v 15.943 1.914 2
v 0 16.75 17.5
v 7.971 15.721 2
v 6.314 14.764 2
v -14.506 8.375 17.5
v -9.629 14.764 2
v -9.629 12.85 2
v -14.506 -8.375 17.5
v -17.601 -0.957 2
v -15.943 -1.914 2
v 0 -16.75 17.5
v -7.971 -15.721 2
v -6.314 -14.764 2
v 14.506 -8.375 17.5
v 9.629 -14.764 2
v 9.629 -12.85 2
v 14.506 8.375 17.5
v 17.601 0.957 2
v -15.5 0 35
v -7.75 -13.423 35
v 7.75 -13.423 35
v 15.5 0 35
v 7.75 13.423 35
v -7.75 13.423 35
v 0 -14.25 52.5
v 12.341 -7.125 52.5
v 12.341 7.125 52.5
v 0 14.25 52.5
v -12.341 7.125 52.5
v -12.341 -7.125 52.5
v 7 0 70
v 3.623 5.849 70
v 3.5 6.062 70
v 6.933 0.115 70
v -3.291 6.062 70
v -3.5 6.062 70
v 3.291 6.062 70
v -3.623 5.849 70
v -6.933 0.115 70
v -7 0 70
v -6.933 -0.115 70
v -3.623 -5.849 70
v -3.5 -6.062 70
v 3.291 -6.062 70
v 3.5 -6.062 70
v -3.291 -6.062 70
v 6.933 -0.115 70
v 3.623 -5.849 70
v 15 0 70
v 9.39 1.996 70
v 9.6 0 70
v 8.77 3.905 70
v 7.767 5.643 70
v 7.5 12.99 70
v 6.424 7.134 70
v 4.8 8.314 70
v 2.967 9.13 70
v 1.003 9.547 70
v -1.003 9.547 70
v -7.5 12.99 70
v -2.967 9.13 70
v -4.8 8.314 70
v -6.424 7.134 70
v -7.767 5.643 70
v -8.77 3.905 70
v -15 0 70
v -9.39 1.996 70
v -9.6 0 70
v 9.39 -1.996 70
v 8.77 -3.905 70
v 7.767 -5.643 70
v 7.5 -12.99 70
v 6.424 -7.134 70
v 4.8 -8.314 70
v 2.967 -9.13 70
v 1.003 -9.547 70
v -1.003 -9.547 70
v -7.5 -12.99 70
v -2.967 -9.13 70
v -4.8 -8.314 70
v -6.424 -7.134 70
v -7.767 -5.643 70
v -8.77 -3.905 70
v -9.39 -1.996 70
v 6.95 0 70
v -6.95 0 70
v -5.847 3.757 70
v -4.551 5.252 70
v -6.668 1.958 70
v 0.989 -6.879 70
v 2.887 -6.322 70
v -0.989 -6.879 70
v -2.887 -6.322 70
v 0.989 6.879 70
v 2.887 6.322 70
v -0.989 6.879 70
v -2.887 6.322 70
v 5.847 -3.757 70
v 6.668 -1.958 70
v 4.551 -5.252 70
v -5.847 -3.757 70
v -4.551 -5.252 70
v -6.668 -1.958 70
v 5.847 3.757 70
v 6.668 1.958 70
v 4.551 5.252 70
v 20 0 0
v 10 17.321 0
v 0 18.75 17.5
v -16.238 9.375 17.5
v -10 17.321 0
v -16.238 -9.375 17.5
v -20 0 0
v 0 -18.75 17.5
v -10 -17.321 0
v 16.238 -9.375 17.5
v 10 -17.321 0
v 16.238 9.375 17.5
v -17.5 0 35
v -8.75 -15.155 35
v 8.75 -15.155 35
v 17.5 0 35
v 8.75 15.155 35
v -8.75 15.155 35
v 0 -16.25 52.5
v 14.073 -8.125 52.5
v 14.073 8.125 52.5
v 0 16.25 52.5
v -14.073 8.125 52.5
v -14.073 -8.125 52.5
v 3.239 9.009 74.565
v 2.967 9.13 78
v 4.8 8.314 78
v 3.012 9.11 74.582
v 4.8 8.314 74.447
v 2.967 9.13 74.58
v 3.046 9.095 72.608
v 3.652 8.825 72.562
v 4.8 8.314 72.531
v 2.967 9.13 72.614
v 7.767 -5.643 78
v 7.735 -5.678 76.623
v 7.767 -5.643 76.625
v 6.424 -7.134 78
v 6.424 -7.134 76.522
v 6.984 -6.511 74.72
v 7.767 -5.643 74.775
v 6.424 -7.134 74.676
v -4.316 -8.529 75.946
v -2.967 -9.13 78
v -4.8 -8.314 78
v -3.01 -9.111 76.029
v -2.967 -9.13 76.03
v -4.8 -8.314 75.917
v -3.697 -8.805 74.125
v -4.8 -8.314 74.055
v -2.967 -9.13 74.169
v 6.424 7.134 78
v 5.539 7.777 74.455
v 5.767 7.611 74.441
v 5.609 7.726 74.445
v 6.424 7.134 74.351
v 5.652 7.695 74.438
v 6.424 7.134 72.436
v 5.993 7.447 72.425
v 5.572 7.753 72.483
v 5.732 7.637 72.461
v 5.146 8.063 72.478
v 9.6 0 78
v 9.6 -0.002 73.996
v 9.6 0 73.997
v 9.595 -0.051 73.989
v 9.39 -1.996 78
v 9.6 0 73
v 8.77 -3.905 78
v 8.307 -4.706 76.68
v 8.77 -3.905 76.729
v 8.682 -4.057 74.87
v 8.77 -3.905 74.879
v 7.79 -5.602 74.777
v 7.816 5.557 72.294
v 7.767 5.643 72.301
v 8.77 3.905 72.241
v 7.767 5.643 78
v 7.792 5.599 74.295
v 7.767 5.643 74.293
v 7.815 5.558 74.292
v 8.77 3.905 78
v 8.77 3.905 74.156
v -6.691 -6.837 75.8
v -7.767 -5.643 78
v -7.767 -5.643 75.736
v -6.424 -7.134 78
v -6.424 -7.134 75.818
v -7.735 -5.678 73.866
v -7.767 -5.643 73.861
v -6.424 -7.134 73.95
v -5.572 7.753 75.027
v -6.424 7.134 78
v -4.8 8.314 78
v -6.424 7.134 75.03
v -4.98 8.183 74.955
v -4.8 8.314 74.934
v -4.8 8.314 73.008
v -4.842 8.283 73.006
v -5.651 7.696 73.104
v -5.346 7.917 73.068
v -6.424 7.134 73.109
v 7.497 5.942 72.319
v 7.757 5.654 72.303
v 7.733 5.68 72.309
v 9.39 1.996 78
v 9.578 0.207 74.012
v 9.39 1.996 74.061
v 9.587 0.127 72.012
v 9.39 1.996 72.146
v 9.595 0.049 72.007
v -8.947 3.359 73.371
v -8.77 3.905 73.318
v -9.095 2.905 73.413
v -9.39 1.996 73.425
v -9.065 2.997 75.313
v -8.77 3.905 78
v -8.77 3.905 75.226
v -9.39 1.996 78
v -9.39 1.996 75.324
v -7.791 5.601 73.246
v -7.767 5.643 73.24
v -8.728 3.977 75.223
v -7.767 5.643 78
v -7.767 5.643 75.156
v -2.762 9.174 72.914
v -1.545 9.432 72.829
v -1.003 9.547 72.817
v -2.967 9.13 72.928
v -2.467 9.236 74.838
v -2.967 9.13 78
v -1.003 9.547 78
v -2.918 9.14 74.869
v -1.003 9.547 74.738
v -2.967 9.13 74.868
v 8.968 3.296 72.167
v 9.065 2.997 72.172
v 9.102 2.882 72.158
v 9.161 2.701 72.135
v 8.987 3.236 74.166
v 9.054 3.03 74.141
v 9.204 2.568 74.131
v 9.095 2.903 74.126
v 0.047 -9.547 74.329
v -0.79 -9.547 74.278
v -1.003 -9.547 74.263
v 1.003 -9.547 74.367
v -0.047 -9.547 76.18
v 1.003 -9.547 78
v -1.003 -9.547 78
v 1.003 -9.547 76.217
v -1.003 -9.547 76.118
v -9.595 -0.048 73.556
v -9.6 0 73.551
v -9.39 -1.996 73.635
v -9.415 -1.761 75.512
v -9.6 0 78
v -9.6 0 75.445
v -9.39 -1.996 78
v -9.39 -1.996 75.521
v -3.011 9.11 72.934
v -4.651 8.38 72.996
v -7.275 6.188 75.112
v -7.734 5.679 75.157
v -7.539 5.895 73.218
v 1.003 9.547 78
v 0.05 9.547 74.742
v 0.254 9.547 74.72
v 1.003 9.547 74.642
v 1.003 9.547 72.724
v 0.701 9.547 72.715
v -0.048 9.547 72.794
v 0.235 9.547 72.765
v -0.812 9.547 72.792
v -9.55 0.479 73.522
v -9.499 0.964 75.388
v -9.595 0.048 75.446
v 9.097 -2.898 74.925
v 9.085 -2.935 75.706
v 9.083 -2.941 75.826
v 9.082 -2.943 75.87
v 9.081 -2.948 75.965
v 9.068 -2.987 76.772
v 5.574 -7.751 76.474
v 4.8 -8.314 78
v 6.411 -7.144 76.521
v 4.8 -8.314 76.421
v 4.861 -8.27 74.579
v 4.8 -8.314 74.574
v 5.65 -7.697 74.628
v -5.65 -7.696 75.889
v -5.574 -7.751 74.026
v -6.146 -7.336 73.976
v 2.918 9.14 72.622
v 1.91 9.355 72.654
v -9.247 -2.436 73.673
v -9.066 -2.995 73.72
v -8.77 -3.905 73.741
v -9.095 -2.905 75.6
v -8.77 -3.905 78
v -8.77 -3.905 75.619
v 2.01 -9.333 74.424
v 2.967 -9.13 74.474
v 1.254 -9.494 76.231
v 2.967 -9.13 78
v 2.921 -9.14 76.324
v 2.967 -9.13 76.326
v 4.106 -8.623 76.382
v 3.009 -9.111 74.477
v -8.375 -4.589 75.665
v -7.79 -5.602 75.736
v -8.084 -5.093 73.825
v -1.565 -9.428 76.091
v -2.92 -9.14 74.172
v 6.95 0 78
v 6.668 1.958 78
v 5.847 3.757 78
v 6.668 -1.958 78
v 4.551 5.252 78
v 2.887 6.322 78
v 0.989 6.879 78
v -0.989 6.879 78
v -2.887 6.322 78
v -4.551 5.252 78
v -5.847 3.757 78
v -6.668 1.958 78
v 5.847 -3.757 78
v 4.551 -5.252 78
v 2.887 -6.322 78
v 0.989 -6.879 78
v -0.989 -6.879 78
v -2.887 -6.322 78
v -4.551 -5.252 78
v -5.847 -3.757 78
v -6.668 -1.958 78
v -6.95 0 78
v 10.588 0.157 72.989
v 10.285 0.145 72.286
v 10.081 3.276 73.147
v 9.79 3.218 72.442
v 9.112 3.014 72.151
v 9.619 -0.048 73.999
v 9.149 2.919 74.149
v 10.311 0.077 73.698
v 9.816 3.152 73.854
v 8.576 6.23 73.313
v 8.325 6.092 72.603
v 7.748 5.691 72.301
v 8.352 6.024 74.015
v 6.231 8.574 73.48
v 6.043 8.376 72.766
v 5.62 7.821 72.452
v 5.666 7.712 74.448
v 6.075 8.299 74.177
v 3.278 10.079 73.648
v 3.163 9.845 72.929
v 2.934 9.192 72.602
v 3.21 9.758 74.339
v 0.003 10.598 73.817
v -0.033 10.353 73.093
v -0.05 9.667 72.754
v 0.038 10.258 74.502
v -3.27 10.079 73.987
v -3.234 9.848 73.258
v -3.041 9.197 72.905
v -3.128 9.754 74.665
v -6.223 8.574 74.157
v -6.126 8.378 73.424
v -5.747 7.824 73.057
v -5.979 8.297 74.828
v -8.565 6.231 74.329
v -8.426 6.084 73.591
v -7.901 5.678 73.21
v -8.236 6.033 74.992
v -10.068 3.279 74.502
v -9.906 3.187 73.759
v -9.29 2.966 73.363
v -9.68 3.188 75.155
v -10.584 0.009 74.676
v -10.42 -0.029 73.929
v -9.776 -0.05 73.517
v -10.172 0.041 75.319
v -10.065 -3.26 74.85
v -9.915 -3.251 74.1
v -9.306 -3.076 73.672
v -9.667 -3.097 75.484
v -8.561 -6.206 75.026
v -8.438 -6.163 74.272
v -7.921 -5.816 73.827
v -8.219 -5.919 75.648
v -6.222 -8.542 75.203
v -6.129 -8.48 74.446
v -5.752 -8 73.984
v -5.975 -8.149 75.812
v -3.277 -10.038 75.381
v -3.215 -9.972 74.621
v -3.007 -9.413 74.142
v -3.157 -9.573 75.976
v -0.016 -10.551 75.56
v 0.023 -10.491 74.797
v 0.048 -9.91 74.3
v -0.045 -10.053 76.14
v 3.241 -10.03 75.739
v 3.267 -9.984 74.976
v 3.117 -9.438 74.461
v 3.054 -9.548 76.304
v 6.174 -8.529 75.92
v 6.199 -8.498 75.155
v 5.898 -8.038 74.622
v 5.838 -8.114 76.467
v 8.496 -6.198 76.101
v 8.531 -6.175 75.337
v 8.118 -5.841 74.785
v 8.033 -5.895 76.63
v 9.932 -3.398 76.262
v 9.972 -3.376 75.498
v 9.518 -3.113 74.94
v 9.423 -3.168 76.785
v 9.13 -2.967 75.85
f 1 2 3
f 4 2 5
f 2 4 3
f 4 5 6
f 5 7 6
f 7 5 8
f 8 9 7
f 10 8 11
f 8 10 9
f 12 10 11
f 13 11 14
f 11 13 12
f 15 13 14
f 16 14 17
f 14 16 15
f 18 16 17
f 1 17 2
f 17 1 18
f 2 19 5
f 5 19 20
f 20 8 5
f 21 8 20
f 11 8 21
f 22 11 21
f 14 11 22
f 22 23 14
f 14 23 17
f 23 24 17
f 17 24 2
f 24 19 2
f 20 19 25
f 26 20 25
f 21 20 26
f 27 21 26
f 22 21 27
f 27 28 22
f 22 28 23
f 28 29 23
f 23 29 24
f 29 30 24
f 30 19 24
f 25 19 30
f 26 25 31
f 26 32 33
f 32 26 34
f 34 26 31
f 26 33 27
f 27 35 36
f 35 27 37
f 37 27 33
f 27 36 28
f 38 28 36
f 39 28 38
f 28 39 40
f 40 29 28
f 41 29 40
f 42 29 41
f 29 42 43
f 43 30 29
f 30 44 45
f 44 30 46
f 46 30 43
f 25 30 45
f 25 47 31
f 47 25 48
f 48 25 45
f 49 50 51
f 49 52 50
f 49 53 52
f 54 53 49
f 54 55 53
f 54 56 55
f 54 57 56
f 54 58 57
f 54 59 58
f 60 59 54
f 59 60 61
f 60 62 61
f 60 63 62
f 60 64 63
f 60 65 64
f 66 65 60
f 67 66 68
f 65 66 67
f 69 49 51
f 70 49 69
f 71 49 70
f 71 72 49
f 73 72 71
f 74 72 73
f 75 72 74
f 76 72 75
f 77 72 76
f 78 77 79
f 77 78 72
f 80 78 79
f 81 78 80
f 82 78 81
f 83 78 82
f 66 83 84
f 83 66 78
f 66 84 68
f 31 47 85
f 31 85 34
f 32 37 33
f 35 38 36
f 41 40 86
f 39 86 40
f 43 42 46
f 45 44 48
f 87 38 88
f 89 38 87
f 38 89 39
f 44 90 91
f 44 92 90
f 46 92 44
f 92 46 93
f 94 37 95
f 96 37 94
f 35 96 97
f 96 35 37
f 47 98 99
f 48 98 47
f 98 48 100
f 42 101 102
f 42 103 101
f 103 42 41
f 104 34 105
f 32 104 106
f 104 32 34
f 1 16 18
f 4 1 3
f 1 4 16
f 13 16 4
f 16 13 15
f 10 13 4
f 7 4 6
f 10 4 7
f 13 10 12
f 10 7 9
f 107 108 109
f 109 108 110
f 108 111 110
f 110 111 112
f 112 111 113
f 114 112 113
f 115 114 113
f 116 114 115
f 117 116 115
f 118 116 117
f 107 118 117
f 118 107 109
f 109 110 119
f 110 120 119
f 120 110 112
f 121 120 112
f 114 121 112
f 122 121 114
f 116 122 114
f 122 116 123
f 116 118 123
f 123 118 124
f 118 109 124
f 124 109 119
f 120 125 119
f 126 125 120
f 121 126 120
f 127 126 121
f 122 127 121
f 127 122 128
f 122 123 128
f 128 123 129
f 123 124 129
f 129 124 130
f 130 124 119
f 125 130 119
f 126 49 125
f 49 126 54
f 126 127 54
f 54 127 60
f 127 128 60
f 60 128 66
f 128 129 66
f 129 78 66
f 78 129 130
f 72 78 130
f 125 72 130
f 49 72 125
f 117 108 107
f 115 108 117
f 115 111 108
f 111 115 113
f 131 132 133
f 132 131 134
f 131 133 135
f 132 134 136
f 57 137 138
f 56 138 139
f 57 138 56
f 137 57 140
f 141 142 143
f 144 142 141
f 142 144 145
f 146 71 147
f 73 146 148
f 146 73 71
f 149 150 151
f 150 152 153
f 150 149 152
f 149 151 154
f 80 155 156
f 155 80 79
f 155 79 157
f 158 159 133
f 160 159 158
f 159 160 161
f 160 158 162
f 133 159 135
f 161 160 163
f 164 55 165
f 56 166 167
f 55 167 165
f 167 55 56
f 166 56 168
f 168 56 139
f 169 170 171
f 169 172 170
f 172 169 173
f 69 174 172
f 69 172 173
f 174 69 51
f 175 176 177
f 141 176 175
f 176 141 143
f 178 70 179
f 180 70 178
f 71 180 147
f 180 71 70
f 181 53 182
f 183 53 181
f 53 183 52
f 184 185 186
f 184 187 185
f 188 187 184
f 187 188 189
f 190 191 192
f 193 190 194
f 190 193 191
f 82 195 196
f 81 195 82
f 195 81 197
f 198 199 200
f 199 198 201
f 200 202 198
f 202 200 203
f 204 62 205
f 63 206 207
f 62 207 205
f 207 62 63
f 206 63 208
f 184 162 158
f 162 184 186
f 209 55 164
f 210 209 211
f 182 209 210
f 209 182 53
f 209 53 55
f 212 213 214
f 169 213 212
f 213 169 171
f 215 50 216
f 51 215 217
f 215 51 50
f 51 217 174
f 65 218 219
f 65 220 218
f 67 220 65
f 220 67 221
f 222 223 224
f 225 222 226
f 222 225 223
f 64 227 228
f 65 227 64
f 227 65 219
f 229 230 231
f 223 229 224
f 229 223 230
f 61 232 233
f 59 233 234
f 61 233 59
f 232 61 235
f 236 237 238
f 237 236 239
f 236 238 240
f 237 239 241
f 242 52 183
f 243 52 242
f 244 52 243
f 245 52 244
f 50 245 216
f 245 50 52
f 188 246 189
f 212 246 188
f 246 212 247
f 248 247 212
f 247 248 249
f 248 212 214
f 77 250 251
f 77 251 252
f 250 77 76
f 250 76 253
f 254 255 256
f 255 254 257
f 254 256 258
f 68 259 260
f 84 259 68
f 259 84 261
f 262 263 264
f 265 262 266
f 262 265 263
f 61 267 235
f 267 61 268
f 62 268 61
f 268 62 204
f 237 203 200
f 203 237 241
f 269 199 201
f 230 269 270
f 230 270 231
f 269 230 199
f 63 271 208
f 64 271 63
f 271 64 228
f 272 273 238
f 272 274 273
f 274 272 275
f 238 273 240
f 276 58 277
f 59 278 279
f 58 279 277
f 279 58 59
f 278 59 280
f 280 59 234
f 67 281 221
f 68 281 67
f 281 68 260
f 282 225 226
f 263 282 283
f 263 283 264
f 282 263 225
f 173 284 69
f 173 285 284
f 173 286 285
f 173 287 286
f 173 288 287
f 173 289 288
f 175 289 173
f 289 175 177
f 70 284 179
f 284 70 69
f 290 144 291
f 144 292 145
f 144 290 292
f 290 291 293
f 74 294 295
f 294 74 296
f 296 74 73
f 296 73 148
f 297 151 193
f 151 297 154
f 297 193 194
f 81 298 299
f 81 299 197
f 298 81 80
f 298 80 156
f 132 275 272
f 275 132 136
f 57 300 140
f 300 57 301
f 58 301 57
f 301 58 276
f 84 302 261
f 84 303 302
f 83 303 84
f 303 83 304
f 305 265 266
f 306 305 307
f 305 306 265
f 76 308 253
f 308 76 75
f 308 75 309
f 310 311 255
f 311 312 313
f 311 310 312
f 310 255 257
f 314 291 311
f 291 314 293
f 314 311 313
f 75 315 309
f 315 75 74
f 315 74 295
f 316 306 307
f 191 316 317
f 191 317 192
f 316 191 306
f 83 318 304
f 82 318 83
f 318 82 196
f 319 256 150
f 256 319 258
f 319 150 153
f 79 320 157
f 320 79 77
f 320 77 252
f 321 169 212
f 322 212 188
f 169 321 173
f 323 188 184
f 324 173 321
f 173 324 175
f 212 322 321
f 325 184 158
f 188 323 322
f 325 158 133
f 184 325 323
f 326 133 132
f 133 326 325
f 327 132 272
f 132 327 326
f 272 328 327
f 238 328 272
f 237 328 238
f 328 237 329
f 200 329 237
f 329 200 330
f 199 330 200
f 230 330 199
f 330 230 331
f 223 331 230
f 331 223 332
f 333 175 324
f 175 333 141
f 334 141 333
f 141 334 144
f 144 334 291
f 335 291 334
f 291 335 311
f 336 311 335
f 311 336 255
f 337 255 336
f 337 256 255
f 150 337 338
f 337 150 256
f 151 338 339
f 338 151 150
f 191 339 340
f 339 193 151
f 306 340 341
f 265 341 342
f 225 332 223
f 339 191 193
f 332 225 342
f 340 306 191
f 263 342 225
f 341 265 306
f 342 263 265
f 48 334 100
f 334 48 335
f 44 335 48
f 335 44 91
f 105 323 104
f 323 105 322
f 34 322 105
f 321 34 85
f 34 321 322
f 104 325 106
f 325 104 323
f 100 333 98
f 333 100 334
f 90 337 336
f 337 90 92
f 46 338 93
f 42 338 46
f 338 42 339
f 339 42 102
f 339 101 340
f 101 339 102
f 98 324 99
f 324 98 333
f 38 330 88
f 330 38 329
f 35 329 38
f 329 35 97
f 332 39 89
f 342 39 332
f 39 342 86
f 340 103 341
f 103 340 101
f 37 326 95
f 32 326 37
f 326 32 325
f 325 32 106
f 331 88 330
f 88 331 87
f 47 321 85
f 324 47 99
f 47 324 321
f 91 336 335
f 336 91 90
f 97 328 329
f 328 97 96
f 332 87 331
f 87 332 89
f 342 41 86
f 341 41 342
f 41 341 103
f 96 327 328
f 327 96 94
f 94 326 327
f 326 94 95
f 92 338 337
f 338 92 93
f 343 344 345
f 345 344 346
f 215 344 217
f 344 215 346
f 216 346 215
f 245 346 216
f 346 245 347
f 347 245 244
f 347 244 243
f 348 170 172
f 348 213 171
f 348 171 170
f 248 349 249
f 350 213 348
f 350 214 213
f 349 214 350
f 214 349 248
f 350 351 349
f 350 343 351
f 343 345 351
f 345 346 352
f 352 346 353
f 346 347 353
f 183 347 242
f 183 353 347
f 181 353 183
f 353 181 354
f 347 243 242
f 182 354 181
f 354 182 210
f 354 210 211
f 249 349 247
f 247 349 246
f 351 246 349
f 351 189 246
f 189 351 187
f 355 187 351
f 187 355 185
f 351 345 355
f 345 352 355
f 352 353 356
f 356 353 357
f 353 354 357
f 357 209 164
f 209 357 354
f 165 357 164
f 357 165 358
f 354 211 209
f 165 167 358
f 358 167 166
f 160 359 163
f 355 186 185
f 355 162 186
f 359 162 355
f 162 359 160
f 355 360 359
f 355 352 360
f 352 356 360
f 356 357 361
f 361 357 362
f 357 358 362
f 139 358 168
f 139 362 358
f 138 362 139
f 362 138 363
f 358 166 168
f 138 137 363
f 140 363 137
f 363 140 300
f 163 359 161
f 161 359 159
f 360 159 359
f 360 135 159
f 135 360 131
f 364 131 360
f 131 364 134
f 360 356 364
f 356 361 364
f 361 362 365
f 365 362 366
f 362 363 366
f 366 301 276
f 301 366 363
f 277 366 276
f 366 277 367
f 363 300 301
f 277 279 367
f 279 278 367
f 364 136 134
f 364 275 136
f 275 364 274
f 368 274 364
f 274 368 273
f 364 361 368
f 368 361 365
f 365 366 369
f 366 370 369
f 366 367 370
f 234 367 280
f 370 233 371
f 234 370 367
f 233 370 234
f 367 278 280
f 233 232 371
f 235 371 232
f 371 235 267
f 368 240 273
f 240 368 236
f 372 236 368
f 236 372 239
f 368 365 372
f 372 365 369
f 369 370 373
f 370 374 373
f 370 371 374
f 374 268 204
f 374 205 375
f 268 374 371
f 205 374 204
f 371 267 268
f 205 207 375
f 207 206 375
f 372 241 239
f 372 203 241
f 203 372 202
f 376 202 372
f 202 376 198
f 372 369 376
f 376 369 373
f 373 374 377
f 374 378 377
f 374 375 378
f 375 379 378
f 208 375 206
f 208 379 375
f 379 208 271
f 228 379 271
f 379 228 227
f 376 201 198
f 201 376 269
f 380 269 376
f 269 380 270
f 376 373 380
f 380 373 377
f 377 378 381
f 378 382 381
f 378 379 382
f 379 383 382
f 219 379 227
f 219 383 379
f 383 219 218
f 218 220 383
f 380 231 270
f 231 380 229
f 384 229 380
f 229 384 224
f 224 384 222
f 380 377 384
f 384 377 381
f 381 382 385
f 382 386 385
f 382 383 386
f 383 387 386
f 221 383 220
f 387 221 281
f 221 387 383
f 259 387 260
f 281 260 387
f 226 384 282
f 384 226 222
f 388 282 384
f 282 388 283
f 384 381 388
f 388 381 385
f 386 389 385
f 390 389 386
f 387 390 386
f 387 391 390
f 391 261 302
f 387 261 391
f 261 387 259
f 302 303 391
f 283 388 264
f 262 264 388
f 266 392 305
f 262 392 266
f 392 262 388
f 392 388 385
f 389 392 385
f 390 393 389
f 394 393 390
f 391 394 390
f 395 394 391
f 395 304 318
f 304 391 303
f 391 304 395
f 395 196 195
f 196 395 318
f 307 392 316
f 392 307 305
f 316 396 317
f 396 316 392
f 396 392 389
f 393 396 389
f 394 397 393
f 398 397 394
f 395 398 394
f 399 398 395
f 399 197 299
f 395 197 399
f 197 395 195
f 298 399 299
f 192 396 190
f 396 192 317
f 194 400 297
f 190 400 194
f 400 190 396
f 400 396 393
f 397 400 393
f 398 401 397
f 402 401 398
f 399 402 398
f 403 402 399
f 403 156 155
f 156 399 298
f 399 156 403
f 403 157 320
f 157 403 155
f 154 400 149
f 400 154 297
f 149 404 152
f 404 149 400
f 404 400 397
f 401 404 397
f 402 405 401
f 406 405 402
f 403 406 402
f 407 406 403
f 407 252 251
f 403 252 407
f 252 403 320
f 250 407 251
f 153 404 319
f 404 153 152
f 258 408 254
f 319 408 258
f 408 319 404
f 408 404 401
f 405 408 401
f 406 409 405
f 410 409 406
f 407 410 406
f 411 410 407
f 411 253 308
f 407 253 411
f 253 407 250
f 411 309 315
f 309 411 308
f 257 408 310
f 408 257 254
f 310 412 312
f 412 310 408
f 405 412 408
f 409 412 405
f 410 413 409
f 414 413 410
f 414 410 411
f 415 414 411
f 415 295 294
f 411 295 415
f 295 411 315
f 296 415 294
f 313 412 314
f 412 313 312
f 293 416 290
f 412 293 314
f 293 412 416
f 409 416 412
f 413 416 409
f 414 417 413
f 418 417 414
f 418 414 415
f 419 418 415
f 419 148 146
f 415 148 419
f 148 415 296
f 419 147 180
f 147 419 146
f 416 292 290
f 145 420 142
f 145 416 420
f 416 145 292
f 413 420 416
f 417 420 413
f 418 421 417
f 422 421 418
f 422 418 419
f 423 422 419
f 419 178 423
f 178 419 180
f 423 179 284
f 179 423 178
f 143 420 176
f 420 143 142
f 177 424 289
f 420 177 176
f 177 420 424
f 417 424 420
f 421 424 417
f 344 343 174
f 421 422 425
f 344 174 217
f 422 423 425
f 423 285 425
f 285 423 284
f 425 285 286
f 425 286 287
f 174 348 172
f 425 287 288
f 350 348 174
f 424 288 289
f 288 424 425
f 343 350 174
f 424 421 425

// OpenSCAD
union() {
	difference() {
		polyhedron(faces = [[0, 6, 1], [1, 6, 7], [1, 7, 2], [2, 7, 8], [2, 8, 3], [3, 8, 9], [3, 9, 4], [4, 9, 10], [4, 10, 5], [5, 10, 11], [5, 11, 0], [0, 11, 6], [6, 12, 7], [7, 12, 13], [7, 13, 8], [8, 13, 14], [8, 14, 9], [9, 14, 15], [9, 15, 10], [10, 15, 16], [10, 16, 11], [11, 16, 17], [11, 17, 6], [6, 17, 12], [12, 18, 13], [13, 18, 19], [13, 19, 14], [14, 19, 20], [14, 20, 15], [15, 20, 21], [15, 21, 16], [16, 21, 22], [16, 22, 17], [17, 22, 23], [17, 23, 12], [12, 23, 18], [18, 24, 19], [19, 24, 25], [19, 25, 20], [20, 25, 26], [20, 26, 21], [21, 26, 27], [21, 27, 22], [22, 27, 28], [22, 28, 23], [23, 28, 29], [23, 29, 18], [18, 29, 24], [1, 30, 0], [24, 31, 25], [2, 30, 1], [25, 31, 26], [3, 30, 2], [26, 31, 27], [4, 30, 3], [27, 31, 28], [5, 30, 4], [28, 31, 29], [0, 30, 5], [29, 31, 24]], points = [[20.0000000000, 0.0000000000, 0.0000000000], [10.0000000000, 17.3205080757, 0.0000000000], [-10.0000000000, 17.3205080757, 0.0000000000], [-20.0000000000, 0.0000000000, 0.0000000000], [-10.0000000000, -17.3205080757, 0.0000000000], [10.0000000000, -17.3205080757, 0.0000000000], [0.0000000000, 18.7500000000, 17.5000000000], [-16.2379763210, 9.3750000000, 17.5000000000], [-16.2379763210, -9.3750000000, 17.5000000000], [-0.0000000000, -18.7500000000, 17.5000000000], [16.2379763210, -9.3750000000, 17.5000000000], [16.2379763210, 9.3750000000, 17.5000000000], [-17.5000000000, 0.0000000000, 35.0000000000], [-8.7500000000, -15.1554445662, 35.0000000000], [8.7500000000, -15.1554445662, 35.0000000000], [17.5000000000, -0.0000000000, 35.0000000000], [8.7500000000, 15.1554445662, 35.0000000000], [-8.7500000000, 15.1554445662, 35.0000000000], [-0.0000000000, -16.2500000000, 52.5000000000], [14.0729128115, -8.1250000000, 52.5000000000], [14.0729128115, 8.1250000000, 52.5000000000], [0.0000000000, 16.2500000000, 52.5000000000], [-14.0729128115, 8.1250000000, 52.5000000000], [-14.0729128115, -8.1250000000, 52.5000000000], [15.0000000000, -0.0000000000, 70.0000000000], [7.5000000000, 12.9903810568, 70.0000000000], [-7.5000000000, 12.9903810568, 70.0000000000], [-15.0000000000, 0.0000000000, 70.0000000000], [-7.5000000000, -12.9903810568, 70.0000000000], [7.5000000000, -12.9903810568, 70.0000000000], [-0.0000000000, 0.0000000000, 0.0000000000], [0.0000000000, 0.0000000000, 70.0000000000]]);
		difference() {
			polyhedron(faces = [[0, 6, 1], [1, 6, 7], [1, 7, 2], [2, 7, 8], [2, 8, 3], [3, 8, 9], [3, 9, 4], [4, 9, 10], [4, 10, 5], [5, 10, 11], [5, 11, 0], [0, 11, 6], [6, 12, 7], [7, 12, 13], [7, 13, 8], [8, 13, 14], [8, 14, 9], [9, 14, 15], [9, 15, 10], [10, 15, 16], [10, 16, 11], [11, 16, 17], [11, 17, 6], [6, 17, 12], [12, 18, 13], [13, 18, 19], [13, 19, 14], [14, 19, 20], [14, 20, 15], [15, 20, 21], [15, 21, 16], [16, 21, 22], [16, 22, 17], [17, 22, 23], [17, 23, 12], [12, 23, 18], [18, 24, 19], [19, 24, 25], [19, 25, 20], [20, 25, 26], [20, 26, 21], [21, 26, 27], [21, 27, 22], [22, 27, 28], [22, 28, 23], [23, 28, 29], [23, 29, 18], [18, 29, 24], [1, 30, 0], [24, 31, 25], [2, 30, 1], [25, 31, 26], [3, 30, 2], [26, 31, 27], [4, 30, 3], [27, 31, 28], [5, 30, 4], [28, 31, 29], [0, 30, 5], [29, 31, 24]], points = [[18.0000000000, 0.0000000000, 0.0000000000], [9.0000000000, 15.5884572681, 0.0000000000], [-9.0000000000, 15.5884572681, 0.0000000000], [-18.0000000000, 0.0000000000, 0.0000000000], [-9.0000000000, -15.5884572681, 0.0000000000], [9.0000000000, -15.5884572681, 0.0000000000], [0.0000000000, 16.7500000000, 17.5000000000], [-14.5059255134, 8.3750000000, 17.5000000000], [-14.5059255134, -8.3750000000, 17.5000000000], [-0.0000000000, -16.7500000000, 17.5000000000], [14.5059255134, -8.3750000000, 17.5000000000], [14.5059255134, 8.3750000000, 17.5000000000], [-15.5000000000, 0.0000000000, 35.0000000000], [-7.7500000000, -13.4233937587, 35.0000000000], [7.7500000000, -13.4233937587, 35.0000000000], [15.5000000000, -0.0000000000, 35.0000000000], [7.7500000000, 13.4233937587, 35.0000000000], [-7.7500000000, 13.4233937587, 35.0000000000], [-0.0000000000, -14.2500000000, 52.5000000000], [12.3408620039, -7.1250000000, 52.5000000000], [12.3408620039, 7.1250000000, 52.5000000000], [0.0000000000, 14.2500000000, 52.5000000000], [-12.3408620039, 7.1250000000, 52.5000000000], [-12.3408620039, -7.1250000000, 52.5000000000], [7.0000000000, -0.0000000000, 70.0000000000], [3.5000000000, 6.0621778265, 70.0000000000], [-3.5000000000, 6.0621778265, 70.0000000000], [-7.0000000000, 0.0000000000, 70.0000000000], [-3.5000000000, -6.0621778265, 70.0000000000], [3.5000000000, -6.0621778265, 70.0000000000], [-0.0000000000, 0.0000000000, 0.0000000000], [0.0000000000, 0.0000000000, 70.0000000000]]);
			cylinder(h = 2, r = 1000);
		}
	}
	translate(v = [0, 0, 70]) {
		union() {
			difference() {
				cylinder(h = 8, r = 9.6000000000);
				cylinder(h = 8, r = 6.9500000000);
			}
			translate(v = [0, 0, 3]) {
				polyhedron(faces = [[0, 8, 1], [1, 8, 9], [1, 9, 2], [2, 9, 10], [2, 10, 3], [3, 10, 11], [3, 11, 4], [4, 11, 12], [4, 12, 5], [5, 12, 13], [5, 13, 6], [6, 13, 14], [6, 14, 7], [7, 14, 15], [7, 15, 0], [0, 15, 8], [8, 16, 9], [9, 16, 17], [9, 17, 10], [10, 17, 18], [10, 18, 11], [11, 18, 19], [11, 19, 12], [12, 19, 20], [12, 20, 13], [13, 20, 21], [13, 21, 14], [14, 21, 22], [14, 22, 15], [15, 22, 23], [15, 23, 8], [8, 23, 16], [16, 24, 17], [17, 24, 25], [17, 25, 18], [18, 25, 26], [18, 26, 19], [19, 26, 27], [19, 27, 20], [20, 27, 28], [20, 28, 21], [21, 28, 29], [21, 29, 22], [22, 29, 30], [22, 30, 23], [23, 30, 31], [23, 31, 16], [16, 31, 24], [24, 32, 25], [25, 32, 33], [25, 33, 26], [26, 33, 34], [26, 34, 27], [27, 34, 35], [27, 35, 28], [28, 35, 36], [28, 36, 29], [29, 36, 37], [29, 37, 30], [30, 37, 38], [30, 38, 31], [31, 38, 39], [31, 39, 24], [24, 39, 32], [32, 40, 33], [33, 40, 41], [33, 41, 34], [34, 41, 42], [34, 42, 35], [35, 42, 43], [35, 43, 36], [36, 43, 44], [36, 44, 37], [37, 44, 45], [37, 45, 38], [38, 45, 46], [38, 46, 39], [39, 46, 47], [39, 47, 32], [32, 47, 40], [40, 48, 41], [41, 48, 49], [41, 49, 42], [42, 49, 50], [42, 50, 43], [43, 50, 51], [43, 51, 44], [44, 51, 52], [44, 52, 45], [45, 52, 53], [45, 53, 46], [46, 53, 54], [46, 54, 47], [47, 54, 55], [47, 55, 40], [40, 55, 48], [48, 56, 49], [49, 56, 57], [49, 57, 50], [50, 57, 58], [50, 58, 51], [51, 58, 59], [51, 59, 52], [52, 59, 60], [52, 60, 53], [53, 60, 61], [53, 61, 54], [54, 61, 62], [54, 62, 55], [55, 62, 63], [55, 63, 48], [48, 63, 56], [56, 64, 57], [57, 64, 65], [57, 65, 58], [58, 65, 66], [58, 66, 59], [59, 66, 67], [59, 67, 60], [60, 67, 68], [60, 68, 61], [61, 68, 69], [61, 69, 62], [62, 69, 70], [62, 70, 63], [63, 70, 71], [63, 71, 56], [56, 71, 64], [64, 72, 65], [65, 72, 73], [65, 73, 66], [66, 73, 74], [66, 74, 67], [67, 74, 75], [67, 75, 68], [68, 75, 76], [68, 76, 69], [69, 76, 77], [69, 77, 70], [70, 77, 78], [70, 78, 71], [71, 78, 79], [71, 79, 64], [64, 79, 72], [72, 80, 73], [73, 80, 81], [73, 81, 74], [74, 81, 82], [74, 82, 75], [75, 82, 83], [75, 83, 76], [76, 83, 84], [76, 84, 77], [77, 84, 85], [77, 85, 78], [78, 85, 86], [78, 86, 79], [79, 86, 87], [79, 87, 72], [72, 87, 80], [80, 88, 81], [81, 88, 89], [81, 89, 82], [82, 89, 90], [82, 90, 83], [83, 90, 91], [83, 91, 84], [84, 91, 92], [84, 92, 85], [85, 92, 93], [85, 93, 86], [86, 93, 94], [86, 94, 87], [87, 94, 95], [87, 95, 80], [80, 95, 88], [88, 96, 89], [89, 96, 97], [89, 97, 90], [90, 97, 98], [90, 98, 91], [91, 98, 99], [91, 99, 92], [92, 99, 100], [92, 100, 93], [93, 100, 101], [93, 101, 94], [94, 101, 102], [94, 102, 95], [95, 102, 103], [95, 103, 88], [88, 103, 96], [96, 104, 97], [97, 104, 105], [97, 105, 98], [98, 105, 106], [98, 106, 99], [99, 106, 107], [99, 107, 100], [100, 107, 108], [100, 108, 101], [101, 108, 109], [101, 109, 102], [102, 109, 110], [102, 110, 103], [103, 110, 111], [103, 111, 96], [96, 111, 104], [104, 112, 105], [105, 112, 113], [105, 113, 106], [106, 113, 114], [106, 114, 107], [107, 114, 115], [107, 115, 108], [108, 115, 116], [108, 116, 109], [109, 116, 117], [109, 117, 110], [110, 117, 118], [110, 118, 111], [111, 118, 119], [111, 119, 104], [104, 119, 112], [112, 120, 113], [113, 120, 121], [113, 121, 114], [114, 121, 122], [114, 122, 115], [115, 122, 123], [115, 123, 116], [116, 123, 124], [116, 124, 117], [117, 124, 125], [117, 125, 118], [118, 125, 126], [118, 126, 119], [119, 126, 127], [119, 127, 112], [112, 127, 120], [120, 128, 121], [121, 128, 129], [121, 129, 122], [122, 129, 130], [122, 130, 123], [123, 130, 131], [123, 131, 124], [124, 131, 132], [124, 132, 125], [125, 132, 133], [125, 133, 126], [126, 133, 134], [126, 134, 127], [127, 134, 135], [127, 135, 120], [120, 135, 128], [128, 136, 129], [129, 136, 137], [129, 137, 130], [130, 137, 138], [130, 138, 131], [131, 138, 139], [131, 139, 132], [132, 139, 140], [132, 140, 133], [133, 140, 141], [133, 141, 134], [134, 141, 142], [134, 142, 135], [135, 142, 143], [135, 143, 128], [128, 143, 136], [136, 144, 137], [137, 144, 145], [137, 145, 138], [138, 145, 146], [138, 146, 139], [139, 146, 147], [139, 147, 140], [140, 147, 148], [140, 148, 141], [141, 148, 149], [141, 149, 142], [142, 149, 150], [142, 150, 143], [143, 150, 151], [143, 151, 136], [136, 151, 144], [144, 152, 145], [145, 152, 153], [145, 153, 146], [146, 153, 154], [146, 154, 147], [147, 154, 155], [147, 155, 148], [148, 155, 156], [148, 156, 149], [149, 156, 157], [149, 157, 150], [150, 157, 158], [150, 158, 151], [151, 158, 159], [151, 159, 144], [144, 159, 152], [1, 160, 0], [152, 161, 153], [2, 160, 1], [153, 161, 154], [3, 160, 2], [154, 161, 155], [4, 160, 3], [155, 161, 156], [5, 160, 4], [156, 161, 157], [6, 160, 5], [157, 161, 158], [7, 160, 6], [158, 161, 159], [0, 160, 7], [159, 161, 152]], points = [[10.5875448974, 0.1569614343, -0.0108712352], [10.2851806798, 0.1446178654, -0.7138719136], [9.5814469126, 0.0475591123, -0.9986961068], [8.8885812924, -0.0773591237, -0.6984976653], [8.6124551026, -0.1569614343, 0.0108712352], [8.9148193202, -0.1446178654, 0.7138719136], [9.6185530874, -0.0475591123, 0.9986961068], [10.3114187076, 0.0773591237, 0.6984976653], [10.0811475671, 3.2757238794, 0.1469816203], [9.7895378030, 3.2184727942, -0.5583356816], [9.1116632465, 3.0136564536, -0.8487195480], [8.4446136191, 2.7812534921, -0.5540670481], [8.1791375458, 2.6574024126, 0.1530183797], [8.4707473098, 2.7146534978, 0.8583356816], [9.1486218664, 2.9194698384, 1.1487195480], [9.8156714938, 3.1518727999, 0.8540670481], [8.5759020156, 6.2299317767, 0.3132120584], [8.3254329850, 6.0923311562, -0.3968004567], [7.7475855823, 5.6913652096, -0.6986367145], [7.1808549791, 5.2619143503, -0.4154851289], [6.9572242764, 5.0555450674, 0.2867879416], [7.2076933070, 5.1931456878, 0.9968004567], [7.7855407096, 5.5941116344, 1.2986367145], [8.3522713129, 6.0235624937, 1.0154851289], [6.2314919167, 8.5743087554, 0.4802713222], [6.0427723771, 8.3760438434, -0.2344750647], [5.6197183721, 7.8207534049, -0.5482652419], [5.2101492000, 7.2337190476, -0.2772851792], [5.0539849273, 6.9588175366, 0.4197286778], [5.2427044669, 7.1570824486, 1.1344750647], [5.6657584719, 7.7123728871, 1.4482652419], [6.0753276440, 8.2994072444, 1.1772851792], [3.2775377607, 10.0793380315, 0.6481948030], [3.1630788385, 9.8447990439, -0.0713029774], [2.9335036889, 9.1916239783, -0.3975605781], [2.7232943209, 8.5024339297, -0.1394607215], [2.6555885313, 8.1809470813, 0.5518051970], [2.7700474535, 8.4154860690, 1.2713029774], [2.9996226031, 9.0686611345, 1.5975605781], [3.2098319711, 9.7578511832, 1.3394607215], [0.0033886103, 10.5977460899, 0.8170168436], [-0.0332316272, 10.3529616299, 0.0927751961], [-0.0503852282, 9.6671024590, -0.2464730748], [-0.0380238459, 8.9419355777, -0.0020009330], [-0.0033886103, 8.6022539101, 0.6829831564], [0.0332316272, 8.8470383701, 1.4072248039], [0.0503852282, 9.5328975410, 1.7464730748], [0.0380238459, 10.2580644223, 1.5020009330], [-3.2702389907, 10.0789586324, 0.9867700144], [-3.2341106805, 9.8484913679, 0.2578214409], [-3.0412566532, 9.1972251122, -0.0949476422], [-2.8046481823, 8.5066628051, 0.1351101097], [-2.6628873013, 8.1813264805, 0.8132299856], [-2.6990156115, 8.4117937450, 1.5421785591], [-2.8918696388, 9.0630600006, 1.8949476422], [-3.1284781097, 9.7536223077, 1.6648898903], [-6.2227129442, 8.5740758031, 1.1574842413], [-6.1262935267, 8.3782600985, 0.4238999289], [-5.7466140870, 7.8241206151, 0.0570765468], [-5.3060856915, 7.2362647470, 0.2718942572], [-5.0627638998, 6.9590504889, 0.9425157587], [-5.1591833173, 7.1548661935, 1.6761000711], [-5.5388627570, 7.7090056769, 2.0429234532], [-5.9793911525, 8.2968615450, 1.8281057428], [-8.5649440356, 6.2308702026, 1.3291857722], [-8.4259127288, 6.0837262125, 0.5910764446], [-7.9006433787, 5.6782575555, 0.2096662773], [-7.2968316467, 5.2519822719, 0.4083801735], [-6.9681822564, 5.0546066414, 1.0708142278], [-7.1072135632, 5.2017506315, 1.8089235554], [-7.6324829133, 5.6072192885, 2.1903337227], [-8.2362946453, 6.0334945721, 1.9916198265], [-10.0677617204, 3.2792897318, 1.5018959704], [-9.9063258171, 3.1873616635, 0.7594176091], [-9.2902122866, 2.9660928182, 0.3628944027], [-8.5803320790, 2.7450994845, 0.5446042677], [-8.1925233924, 2.6538365602, 1.1981040296], [-8.3539592957, 2.7457646285, 1.9405823909], [-8.9700728263, 2.9670334738, 2.3371055973], [-9.6799530338, 3.1880268075, 2.1553957323], [-10.5844162052, 0.0088804748, 1.6756299292], [-10.4204351423, -0.0288723061, 0.9289898712], [-9.7758543001, -0.0497120818, 0.5168398024], [-9.0282603938, -0.0414311941, 0.6806116434], [-8.6155837948, -0.0088804748, 1.3243700708], [-8.7795648577, 0.0288723061, 2.0710101288], [-9.4241456999, 0.0497120818, 2.4831601976], [-10.1717396062, 0.0414311941, 2.3193883566], [-10.0649884197, -3.2596588491, 1.8503949120], [-9.9153058143, -3.2509268119, 1.0998582328], [-9.3056852211, -3.0756183959, 0.6715871396], [-8.5932341157, -2.8364268936, 0.8164570305], [-8.1952966931, -2.6734674429, 1.4496050880], [-8.3449792986, -2.6821994801, 2.2001417672], [-8.9545998918, -2.8575078961, 2.6284128604], [-9.6670509972, -3.0966993984, 2.4835429695], [-8.5612813896, -6.2059982343, 2.0261886316], [-8.4376294936, -6.1632913702, 1.2720846799], [-7.9208760324, -5.8156516489, 0.8272263629], [-7.3137281752, -5.3667217045, 0.9522056494], [-6.9718449024, -5.0794786097, 1.5738113684], [-7.0954967984, -5.1221854738, 2.3279153201], [-7.6122502596, -5.4698251951, 2.7727736371], [-8.2193981168, -5.9187551395, 2.6477943506], [-6.2217008273, -8.5416727177, 2.2029974015], [-6.1294672541, -8.4798674857, 1.4457263015], [-5.7521145322, -8.0002182457, 0.9838518949], [-5.3106907684, -7.3836970172, 1.0879339450], [-5.0637760167, -6.9914535743, 1.6970025985], [-5.1560095899, -7.0532588063, 2.4542736985], [-5.5333623118, -7.5329080463, 2.9161481051], [-5.9747860756, -8.1494292748, 2.8120660550], [-3.2766183729, -10.0384488750, 2.3807942093], [-3.2146487992, -9.9720763905, 1.6208330900], [-3.0073540144, -9.4125104847, 1.1415614479], [-2.7761644922, -8.6875372761, 1.2237301110], [-2.6565079191, -8.2218362379, 1.8192057907], [-2.7184774928, -8.2882087223, 2.5791669100], [-2.9257722776, -8.8477746282, 3.0584385521], [-3.1569617998, -9.5727478368, 2.9762698890], [-0.0156512826, -10.5507586521, 2.5595367875], [0.0228827708, -10.4914430698, 1.7974454373], [0.0480124073, -9.9099322272, 1.3004544122], [0.0450170269, -9.1468672894, 1.3596943143], [0.0156512826, -8.6492413479, 1.9404632125], [-0.0228827708, -8.7085569302, 2.7025545627], [-0.0480124073, -9.2900677728, 3.1995455878], [-0.0450170269, -10.0531327106, 3.1403056857], [3.2409052721, -10.0299775236, 2.7391657851], [3.2666997131, -9.9844231645, 1.9755913717], [3.1166782236, -9.4384428113, 1.4606297767], [2.8787213576, -8.7118643501, 1.4959385185], [2.6922210199, -8.2303075893, 2.0608342149], [2.6664265789, -8.2758619484, 2.8244086283], [2.8164480684, -8.8218423016, 3.3393702233], [3.0544049344, -9.5484207628, 3.3040614815], [6.1736726714, -8.5291261424, 2.9196031648], [6.1988164301, -8.4979838311, 2.1552836076], [5.8982172334, -8.0383852022, 1.6221835598], [5.4479620139, -7.4195568994, 1.6325857993], [5.1118041727, -7.0040001496, 2.1803968352], [5.0866604139, -7.0351424609, 2.9447163924], [5.3872596106, -7.4947410898, 3.4778164402], [5.8375148301, -8.1135693926, 3.4674142007], [8.4956821768, -6.1975213423, 3.1007509828], [8.5309001335, -6.1753440322, 2.3365165292], [8.1183798491, -5.8411735790, 1.7852057631], [7.4997701115, -5.3907625021, 1.7697690542], [7.0374441152, -5.0879555017, 2.2992490172], [7.0022261585, -5.1101328118, 3.0634834708], [7.4147464429, -5.4443032650, 3.6147942369], [8.0333561805, -5.8947143419, 3.6302309458], [9.9324090893, -3.3984383780, 3.2621312828], [9.9719974222, -3.3757869628, 2.4981246631], [9.5184385923, -3.1134177858, 1.9402418435], [8.8374212108, -2.7650231525, 1.9152830135], [8.3278760236, -2.5346879140, 2.4378687172], [8.2882876907, -2.5573393291, 3.2018753369], [8.7418465205, -2.8197085062, 3.7597581565], [9.4228639020, -3.1681031395, 3.7847169865], [9.6000000000, -0.0000000000, -0.0000000000], [9.1301425564, -2.9665631460, 2.8500000000]]);
			}
		}
	}
}
